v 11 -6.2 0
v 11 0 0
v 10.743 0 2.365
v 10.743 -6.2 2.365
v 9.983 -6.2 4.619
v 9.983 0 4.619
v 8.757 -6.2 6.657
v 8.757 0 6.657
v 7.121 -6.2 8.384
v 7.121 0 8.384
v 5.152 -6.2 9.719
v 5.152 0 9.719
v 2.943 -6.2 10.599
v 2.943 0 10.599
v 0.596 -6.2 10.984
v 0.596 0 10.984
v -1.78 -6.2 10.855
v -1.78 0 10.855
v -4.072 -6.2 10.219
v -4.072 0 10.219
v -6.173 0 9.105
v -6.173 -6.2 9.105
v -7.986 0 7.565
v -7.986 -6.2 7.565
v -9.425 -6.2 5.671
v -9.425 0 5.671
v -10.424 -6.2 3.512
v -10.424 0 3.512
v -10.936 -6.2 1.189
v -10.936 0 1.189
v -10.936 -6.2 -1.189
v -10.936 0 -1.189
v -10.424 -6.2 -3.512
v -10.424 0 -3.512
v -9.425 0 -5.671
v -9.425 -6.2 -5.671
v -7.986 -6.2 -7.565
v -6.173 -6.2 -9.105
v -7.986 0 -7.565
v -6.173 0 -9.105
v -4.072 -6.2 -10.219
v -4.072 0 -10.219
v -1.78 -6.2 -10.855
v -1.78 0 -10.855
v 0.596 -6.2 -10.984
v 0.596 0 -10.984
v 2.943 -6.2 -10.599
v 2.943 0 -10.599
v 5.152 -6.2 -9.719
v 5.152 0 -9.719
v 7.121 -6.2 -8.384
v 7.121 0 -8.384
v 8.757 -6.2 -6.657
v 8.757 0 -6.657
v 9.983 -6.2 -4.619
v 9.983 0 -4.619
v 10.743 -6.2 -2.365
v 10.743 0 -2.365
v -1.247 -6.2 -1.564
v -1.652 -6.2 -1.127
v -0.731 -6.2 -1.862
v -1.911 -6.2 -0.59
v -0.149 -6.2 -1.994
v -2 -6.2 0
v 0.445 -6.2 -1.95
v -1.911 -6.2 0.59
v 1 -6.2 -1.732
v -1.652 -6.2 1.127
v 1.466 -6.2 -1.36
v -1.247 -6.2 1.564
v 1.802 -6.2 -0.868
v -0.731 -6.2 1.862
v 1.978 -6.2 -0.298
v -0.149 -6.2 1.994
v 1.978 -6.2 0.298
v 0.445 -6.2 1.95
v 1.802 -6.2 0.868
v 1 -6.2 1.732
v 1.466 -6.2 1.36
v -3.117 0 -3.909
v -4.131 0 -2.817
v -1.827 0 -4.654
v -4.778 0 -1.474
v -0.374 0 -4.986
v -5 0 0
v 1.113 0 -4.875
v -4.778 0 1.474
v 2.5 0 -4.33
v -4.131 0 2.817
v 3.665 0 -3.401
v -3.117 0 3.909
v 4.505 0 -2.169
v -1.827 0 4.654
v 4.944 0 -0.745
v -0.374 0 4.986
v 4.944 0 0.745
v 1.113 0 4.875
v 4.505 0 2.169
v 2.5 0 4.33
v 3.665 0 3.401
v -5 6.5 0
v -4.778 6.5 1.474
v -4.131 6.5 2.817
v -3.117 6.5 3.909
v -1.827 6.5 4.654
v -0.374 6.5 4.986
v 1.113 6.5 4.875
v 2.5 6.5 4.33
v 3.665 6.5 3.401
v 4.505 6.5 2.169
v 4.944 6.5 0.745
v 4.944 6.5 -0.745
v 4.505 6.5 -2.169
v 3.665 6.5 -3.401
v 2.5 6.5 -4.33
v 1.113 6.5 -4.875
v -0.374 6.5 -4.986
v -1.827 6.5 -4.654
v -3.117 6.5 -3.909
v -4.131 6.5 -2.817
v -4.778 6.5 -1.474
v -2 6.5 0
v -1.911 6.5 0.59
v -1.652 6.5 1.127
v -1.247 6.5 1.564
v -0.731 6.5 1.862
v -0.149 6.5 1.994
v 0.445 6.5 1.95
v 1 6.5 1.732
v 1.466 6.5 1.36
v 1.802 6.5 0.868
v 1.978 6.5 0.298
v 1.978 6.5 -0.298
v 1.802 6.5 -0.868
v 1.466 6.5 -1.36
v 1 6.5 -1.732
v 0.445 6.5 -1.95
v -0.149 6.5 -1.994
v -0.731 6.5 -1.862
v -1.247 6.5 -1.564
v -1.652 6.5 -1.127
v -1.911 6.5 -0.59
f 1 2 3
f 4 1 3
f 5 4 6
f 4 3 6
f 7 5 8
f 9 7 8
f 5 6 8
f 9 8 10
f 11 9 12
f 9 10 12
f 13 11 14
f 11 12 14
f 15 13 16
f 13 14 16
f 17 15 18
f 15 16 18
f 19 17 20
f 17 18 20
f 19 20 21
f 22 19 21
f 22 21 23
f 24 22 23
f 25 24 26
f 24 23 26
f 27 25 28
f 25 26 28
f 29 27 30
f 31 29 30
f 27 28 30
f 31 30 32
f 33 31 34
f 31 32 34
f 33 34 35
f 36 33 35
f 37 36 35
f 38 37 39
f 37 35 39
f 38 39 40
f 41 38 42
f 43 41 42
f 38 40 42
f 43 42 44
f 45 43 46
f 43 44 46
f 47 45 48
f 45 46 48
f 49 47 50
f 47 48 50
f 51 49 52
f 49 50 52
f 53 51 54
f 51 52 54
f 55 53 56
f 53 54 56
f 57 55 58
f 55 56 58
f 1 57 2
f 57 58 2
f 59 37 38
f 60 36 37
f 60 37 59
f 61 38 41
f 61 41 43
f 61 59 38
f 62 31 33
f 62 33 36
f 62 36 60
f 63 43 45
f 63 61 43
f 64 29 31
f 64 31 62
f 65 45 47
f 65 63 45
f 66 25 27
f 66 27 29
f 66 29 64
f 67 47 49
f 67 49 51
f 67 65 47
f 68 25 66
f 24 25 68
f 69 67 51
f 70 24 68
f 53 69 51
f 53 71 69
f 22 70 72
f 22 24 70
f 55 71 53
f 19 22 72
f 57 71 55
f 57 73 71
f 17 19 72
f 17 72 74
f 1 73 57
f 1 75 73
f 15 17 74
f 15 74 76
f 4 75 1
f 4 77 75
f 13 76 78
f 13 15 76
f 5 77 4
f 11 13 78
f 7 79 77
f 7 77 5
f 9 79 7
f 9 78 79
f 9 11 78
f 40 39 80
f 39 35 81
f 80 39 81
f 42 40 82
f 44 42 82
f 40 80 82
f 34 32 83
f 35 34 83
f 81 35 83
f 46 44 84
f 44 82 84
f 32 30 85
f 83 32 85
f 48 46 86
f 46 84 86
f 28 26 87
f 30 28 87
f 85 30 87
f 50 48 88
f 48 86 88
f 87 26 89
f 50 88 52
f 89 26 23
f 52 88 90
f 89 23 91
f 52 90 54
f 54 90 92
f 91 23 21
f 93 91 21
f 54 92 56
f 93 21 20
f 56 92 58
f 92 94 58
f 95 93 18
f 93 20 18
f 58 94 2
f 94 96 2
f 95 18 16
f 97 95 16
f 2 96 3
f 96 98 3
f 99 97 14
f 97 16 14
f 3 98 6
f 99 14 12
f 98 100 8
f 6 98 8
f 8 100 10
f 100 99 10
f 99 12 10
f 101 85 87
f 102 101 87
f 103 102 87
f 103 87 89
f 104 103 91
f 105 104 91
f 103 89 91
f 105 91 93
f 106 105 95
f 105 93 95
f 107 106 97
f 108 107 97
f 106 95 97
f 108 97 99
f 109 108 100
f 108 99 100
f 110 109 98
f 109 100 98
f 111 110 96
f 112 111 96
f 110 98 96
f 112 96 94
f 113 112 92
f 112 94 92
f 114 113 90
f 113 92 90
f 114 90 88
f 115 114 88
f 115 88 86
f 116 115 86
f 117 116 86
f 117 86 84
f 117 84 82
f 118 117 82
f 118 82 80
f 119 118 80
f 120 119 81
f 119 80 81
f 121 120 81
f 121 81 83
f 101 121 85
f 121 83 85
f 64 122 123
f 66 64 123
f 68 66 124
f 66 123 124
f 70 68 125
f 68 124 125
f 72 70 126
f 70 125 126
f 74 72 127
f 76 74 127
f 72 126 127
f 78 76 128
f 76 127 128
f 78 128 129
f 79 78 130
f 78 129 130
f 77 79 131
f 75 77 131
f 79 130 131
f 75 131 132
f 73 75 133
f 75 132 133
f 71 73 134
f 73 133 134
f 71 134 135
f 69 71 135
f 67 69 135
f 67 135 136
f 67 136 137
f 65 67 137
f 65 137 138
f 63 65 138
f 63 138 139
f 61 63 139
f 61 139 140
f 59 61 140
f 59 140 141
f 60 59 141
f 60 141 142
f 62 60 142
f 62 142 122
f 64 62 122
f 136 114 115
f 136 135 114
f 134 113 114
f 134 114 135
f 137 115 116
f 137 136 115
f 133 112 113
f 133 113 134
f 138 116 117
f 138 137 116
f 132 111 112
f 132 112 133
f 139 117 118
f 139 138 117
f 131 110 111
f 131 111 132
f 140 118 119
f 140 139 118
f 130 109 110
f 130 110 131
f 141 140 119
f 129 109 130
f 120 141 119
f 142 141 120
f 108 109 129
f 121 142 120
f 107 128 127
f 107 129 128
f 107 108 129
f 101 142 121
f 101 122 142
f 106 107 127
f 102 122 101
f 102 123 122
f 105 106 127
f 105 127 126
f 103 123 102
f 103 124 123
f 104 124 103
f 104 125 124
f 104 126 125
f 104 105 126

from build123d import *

# Parameters (mm, degrees)
F0_R     = 11
F1_DEPTH = 6.2
F2_R     = 5
F3_DEPTH = 6.5
F4_R     = 2
F5_DEPTH = 25


with BuildPart() as f1:
    # F0 (on Front) → F1 (new body)
    with BuildSketch(Plane.XZ):
        Circle(F0_R)
    extrude(amount=F1_DEPTH)

    # F2 (on face) → F3 (join)
    with BuildSketch(Plane(origin=(0, 0, 0), x_dir=(-1, 0, 0), z_dir=(0, 1, 0))):
        Circle(F2_R)
    extrude(amount=F3_DEPTH)

    # F4 (on face) → F5 (cut)
    with BuildSketch(Plane(origin=(0, 6.5, 0), x_dir=(-1, 0, 0), z_dir=(0, 1, 0))):
        Circle(F4_R)
    extrude(amount=-F5_DEPTH, mode=Mode.SUBTRACT)


solid = f1.part
